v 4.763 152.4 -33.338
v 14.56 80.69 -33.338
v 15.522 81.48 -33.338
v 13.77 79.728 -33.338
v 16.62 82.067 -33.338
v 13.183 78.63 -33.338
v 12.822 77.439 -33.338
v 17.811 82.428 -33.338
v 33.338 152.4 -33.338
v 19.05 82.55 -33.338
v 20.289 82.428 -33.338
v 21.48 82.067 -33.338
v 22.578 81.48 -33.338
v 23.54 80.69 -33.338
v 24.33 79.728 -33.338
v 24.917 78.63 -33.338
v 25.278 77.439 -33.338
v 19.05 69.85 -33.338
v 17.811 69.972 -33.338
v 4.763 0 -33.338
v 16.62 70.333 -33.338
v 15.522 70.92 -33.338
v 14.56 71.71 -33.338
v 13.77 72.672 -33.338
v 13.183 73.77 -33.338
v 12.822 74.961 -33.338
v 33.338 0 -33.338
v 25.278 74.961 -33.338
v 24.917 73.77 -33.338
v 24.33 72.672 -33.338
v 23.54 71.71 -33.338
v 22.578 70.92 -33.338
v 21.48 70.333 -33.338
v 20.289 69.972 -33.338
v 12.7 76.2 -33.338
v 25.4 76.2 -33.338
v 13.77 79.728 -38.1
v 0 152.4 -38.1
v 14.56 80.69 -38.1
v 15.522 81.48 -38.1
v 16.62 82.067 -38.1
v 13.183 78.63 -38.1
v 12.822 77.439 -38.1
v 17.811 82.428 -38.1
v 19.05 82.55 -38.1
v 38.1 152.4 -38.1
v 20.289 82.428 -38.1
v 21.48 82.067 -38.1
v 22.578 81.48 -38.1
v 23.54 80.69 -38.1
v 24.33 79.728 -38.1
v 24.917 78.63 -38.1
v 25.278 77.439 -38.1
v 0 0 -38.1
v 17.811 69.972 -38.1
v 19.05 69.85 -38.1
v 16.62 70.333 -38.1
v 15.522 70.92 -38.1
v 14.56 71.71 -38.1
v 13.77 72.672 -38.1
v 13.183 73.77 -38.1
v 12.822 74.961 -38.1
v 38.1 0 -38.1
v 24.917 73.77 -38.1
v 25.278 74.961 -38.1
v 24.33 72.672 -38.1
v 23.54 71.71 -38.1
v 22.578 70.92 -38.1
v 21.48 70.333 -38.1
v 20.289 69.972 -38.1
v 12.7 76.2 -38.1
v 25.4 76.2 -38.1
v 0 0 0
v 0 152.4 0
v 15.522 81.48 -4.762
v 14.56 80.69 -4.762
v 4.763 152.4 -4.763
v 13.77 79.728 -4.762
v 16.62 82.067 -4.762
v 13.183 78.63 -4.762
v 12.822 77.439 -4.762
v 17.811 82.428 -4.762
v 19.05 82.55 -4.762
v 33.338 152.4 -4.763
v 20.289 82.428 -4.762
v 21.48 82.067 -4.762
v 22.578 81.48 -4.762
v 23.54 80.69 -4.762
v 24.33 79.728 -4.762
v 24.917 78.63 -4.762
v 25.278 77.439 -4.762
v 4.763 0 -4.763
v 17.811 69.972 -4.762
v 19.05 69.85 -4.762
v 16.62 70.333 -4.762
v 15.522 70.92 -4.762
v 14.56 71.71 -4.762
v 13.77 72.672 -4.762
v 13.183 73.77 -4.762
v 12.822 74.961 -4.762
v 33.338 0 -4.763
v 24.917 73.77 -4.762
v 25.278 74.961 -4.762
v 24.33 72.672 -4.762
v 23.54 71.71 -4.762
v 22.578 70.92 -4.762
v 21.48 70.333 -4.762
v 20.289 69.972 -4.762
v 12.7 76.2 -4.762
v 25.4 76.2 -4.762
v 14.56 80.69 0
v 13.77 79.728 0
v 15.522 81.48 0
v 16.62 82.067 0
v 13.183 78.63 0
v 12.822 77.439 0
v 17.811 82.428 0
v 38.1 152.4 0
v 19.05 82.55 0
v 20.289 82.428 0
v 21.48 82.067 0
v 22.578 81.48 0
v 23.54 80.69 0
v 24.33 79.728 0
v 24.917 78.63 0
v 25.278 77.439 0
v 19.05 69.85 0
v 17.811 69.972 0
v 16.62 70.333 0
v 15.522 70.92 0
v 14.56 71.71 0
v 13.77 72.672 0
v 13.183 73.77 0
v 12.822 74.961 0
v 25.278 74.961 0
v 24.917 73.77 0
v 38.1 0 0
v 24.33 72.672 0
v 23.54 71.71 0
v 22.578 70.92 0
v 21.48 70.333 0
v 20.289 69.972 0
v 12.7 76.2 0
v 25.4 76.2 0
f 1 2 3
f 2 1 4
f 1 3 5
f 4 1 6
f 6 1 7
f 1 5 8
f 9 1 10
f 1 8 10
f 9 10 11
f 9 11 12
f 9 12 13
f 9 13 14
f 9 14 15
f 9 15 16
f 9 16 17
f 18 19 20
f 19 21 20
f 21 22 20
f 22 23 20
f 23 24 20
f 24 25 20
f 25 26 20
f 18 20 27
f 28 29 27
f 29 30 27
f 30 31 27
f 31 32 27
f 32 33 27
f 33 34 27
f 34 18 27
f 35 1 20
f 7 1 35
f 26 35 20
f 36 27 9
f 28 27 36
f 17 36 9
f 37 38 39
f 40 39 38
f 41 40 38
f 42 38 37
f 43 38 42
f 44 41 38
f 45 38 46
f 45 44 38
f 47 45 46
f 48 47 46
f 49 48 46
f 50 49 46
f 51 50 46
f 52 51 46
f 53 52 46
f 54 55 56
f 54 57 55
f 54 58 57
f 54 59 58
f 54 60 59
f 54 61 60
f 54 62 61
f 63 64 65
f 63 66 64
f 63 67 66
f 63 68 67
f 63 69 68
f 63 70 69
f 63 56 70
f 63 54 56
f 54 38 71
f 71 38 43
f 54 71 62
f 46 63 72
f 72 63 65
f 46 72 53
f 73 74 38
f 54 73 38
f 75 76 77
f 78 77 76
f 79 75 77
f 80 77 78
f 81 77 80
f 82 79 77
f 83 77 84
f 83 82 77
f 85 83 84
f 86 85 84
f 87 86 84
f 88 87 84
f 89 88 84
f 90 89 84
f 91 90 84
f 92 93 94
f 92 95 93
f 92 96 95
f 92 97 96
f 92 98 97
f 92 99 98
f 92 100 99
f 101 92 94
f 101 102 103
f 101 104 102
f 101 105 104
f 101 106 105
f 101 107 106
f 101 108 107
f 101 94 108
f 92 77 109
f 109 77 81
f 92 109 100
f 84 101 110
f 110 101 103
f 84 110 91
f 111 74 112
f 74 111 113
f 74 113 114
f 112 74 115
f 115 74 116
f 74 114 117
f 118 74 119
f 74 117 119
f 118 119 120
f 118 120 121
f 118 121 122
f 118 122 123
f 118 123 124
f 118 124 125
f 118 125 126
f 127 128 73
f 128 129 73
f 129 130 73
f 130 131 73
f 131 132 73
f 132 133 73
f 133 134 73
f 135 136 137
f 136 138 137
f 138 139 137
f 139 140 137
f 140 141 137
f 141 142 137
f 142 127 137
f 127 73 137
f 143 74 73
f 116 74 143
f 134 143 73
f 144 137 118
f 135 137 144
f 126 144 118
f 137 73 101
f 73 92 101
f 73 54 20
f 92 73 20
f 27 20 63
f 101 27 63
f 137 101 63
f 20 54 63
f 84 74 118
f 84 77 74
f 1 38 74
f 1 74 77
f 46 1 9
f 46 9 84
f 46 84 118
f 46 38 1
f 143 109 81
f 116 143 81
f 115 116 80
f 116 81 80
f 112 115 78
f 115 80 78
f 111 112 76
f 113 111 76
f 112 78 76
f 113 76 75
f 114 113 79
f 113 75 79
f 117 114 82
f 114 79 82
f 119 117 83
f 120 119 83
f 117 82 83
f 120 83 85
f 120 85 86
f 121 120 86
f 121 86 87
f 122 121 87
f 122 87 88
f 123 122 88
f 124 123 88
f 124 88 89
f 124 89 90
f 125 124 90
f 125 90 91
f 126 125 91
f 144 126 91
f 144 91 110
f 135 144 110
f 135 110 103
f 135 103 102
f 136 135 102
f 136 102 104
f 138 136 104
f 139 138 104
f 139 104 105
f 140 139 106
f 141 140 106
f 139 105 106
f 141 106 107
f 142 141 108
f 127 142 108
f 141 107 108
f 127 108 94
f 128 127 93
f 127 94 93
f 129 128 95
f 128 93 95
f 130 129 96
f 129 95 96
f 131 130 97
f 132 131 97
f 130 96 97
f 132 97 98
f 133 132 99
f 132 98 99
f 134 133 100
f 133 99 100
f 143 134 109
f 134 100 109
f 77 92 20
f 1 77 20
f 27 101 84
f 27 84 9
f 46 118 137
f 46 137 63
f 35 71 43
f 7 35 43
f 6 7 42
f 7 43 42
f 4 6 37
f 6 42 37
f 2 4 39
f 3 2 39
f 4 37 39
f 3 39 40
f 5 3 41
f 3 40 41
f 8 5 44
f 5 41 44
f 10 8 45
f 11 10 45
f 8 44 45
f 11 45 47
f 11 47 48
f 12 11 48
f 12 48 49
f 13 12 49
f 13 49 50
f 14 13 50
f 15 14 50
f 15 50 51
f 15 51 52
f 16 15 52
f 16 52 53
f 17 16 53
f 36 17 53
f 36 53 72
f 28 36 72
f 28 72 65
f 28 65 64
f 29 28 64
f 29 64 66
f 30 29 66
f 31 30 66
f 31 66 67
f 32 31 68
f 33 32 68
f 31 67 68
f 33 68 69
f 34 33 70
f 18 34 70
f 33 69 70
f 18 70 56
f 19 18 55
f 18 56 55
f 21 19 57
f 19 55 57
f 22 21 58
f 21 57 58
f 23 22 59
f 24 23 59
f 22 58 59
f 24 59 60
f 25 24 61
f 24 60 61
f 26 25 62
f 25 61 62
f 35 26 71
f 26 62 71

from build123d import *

# Parameters (mm, degrees)
SKETCH1_W                  = 38.1
SKETCH1_H                  = 38.1
SKETCH1_W_2                = 28.575
SKETCH1_H_2                = 28.575
BOSS_EXTRUDE1_DEPTH        = 152.4
F_1_2_0_5_DIAMETER_HOLE1_D = 12.7


with BuildPart() as part:
    # Sketch1 → Boss-Extrude1 (new body)
    with BuildSketch(Plane(origin=(0, 0, 0), x_dir=(1, 0, 0), z_dir=(0, 1, 0))):
        with Locations((19.05, 19.05)):
            Rectangle(SKETCH1_W, SKETCH1_H)
        with Locations((19.05, 19.05)):
            Rectangle(SKETCH1_W_2, SKETCH1_H_2, mode=Mode.SUBTRACT)
    extrude(amount=BOSS_EXTRUDE1_DEPTH)

    # 1/2 (0.5) Diameter Hole1 (through all)
    with Locations(Plane.XY):
        with Locations((19.05, 76.2)):
            Hole(F_1_2_0_5_DIAMETER_HOLE1_D / 2)


solid = part.part
